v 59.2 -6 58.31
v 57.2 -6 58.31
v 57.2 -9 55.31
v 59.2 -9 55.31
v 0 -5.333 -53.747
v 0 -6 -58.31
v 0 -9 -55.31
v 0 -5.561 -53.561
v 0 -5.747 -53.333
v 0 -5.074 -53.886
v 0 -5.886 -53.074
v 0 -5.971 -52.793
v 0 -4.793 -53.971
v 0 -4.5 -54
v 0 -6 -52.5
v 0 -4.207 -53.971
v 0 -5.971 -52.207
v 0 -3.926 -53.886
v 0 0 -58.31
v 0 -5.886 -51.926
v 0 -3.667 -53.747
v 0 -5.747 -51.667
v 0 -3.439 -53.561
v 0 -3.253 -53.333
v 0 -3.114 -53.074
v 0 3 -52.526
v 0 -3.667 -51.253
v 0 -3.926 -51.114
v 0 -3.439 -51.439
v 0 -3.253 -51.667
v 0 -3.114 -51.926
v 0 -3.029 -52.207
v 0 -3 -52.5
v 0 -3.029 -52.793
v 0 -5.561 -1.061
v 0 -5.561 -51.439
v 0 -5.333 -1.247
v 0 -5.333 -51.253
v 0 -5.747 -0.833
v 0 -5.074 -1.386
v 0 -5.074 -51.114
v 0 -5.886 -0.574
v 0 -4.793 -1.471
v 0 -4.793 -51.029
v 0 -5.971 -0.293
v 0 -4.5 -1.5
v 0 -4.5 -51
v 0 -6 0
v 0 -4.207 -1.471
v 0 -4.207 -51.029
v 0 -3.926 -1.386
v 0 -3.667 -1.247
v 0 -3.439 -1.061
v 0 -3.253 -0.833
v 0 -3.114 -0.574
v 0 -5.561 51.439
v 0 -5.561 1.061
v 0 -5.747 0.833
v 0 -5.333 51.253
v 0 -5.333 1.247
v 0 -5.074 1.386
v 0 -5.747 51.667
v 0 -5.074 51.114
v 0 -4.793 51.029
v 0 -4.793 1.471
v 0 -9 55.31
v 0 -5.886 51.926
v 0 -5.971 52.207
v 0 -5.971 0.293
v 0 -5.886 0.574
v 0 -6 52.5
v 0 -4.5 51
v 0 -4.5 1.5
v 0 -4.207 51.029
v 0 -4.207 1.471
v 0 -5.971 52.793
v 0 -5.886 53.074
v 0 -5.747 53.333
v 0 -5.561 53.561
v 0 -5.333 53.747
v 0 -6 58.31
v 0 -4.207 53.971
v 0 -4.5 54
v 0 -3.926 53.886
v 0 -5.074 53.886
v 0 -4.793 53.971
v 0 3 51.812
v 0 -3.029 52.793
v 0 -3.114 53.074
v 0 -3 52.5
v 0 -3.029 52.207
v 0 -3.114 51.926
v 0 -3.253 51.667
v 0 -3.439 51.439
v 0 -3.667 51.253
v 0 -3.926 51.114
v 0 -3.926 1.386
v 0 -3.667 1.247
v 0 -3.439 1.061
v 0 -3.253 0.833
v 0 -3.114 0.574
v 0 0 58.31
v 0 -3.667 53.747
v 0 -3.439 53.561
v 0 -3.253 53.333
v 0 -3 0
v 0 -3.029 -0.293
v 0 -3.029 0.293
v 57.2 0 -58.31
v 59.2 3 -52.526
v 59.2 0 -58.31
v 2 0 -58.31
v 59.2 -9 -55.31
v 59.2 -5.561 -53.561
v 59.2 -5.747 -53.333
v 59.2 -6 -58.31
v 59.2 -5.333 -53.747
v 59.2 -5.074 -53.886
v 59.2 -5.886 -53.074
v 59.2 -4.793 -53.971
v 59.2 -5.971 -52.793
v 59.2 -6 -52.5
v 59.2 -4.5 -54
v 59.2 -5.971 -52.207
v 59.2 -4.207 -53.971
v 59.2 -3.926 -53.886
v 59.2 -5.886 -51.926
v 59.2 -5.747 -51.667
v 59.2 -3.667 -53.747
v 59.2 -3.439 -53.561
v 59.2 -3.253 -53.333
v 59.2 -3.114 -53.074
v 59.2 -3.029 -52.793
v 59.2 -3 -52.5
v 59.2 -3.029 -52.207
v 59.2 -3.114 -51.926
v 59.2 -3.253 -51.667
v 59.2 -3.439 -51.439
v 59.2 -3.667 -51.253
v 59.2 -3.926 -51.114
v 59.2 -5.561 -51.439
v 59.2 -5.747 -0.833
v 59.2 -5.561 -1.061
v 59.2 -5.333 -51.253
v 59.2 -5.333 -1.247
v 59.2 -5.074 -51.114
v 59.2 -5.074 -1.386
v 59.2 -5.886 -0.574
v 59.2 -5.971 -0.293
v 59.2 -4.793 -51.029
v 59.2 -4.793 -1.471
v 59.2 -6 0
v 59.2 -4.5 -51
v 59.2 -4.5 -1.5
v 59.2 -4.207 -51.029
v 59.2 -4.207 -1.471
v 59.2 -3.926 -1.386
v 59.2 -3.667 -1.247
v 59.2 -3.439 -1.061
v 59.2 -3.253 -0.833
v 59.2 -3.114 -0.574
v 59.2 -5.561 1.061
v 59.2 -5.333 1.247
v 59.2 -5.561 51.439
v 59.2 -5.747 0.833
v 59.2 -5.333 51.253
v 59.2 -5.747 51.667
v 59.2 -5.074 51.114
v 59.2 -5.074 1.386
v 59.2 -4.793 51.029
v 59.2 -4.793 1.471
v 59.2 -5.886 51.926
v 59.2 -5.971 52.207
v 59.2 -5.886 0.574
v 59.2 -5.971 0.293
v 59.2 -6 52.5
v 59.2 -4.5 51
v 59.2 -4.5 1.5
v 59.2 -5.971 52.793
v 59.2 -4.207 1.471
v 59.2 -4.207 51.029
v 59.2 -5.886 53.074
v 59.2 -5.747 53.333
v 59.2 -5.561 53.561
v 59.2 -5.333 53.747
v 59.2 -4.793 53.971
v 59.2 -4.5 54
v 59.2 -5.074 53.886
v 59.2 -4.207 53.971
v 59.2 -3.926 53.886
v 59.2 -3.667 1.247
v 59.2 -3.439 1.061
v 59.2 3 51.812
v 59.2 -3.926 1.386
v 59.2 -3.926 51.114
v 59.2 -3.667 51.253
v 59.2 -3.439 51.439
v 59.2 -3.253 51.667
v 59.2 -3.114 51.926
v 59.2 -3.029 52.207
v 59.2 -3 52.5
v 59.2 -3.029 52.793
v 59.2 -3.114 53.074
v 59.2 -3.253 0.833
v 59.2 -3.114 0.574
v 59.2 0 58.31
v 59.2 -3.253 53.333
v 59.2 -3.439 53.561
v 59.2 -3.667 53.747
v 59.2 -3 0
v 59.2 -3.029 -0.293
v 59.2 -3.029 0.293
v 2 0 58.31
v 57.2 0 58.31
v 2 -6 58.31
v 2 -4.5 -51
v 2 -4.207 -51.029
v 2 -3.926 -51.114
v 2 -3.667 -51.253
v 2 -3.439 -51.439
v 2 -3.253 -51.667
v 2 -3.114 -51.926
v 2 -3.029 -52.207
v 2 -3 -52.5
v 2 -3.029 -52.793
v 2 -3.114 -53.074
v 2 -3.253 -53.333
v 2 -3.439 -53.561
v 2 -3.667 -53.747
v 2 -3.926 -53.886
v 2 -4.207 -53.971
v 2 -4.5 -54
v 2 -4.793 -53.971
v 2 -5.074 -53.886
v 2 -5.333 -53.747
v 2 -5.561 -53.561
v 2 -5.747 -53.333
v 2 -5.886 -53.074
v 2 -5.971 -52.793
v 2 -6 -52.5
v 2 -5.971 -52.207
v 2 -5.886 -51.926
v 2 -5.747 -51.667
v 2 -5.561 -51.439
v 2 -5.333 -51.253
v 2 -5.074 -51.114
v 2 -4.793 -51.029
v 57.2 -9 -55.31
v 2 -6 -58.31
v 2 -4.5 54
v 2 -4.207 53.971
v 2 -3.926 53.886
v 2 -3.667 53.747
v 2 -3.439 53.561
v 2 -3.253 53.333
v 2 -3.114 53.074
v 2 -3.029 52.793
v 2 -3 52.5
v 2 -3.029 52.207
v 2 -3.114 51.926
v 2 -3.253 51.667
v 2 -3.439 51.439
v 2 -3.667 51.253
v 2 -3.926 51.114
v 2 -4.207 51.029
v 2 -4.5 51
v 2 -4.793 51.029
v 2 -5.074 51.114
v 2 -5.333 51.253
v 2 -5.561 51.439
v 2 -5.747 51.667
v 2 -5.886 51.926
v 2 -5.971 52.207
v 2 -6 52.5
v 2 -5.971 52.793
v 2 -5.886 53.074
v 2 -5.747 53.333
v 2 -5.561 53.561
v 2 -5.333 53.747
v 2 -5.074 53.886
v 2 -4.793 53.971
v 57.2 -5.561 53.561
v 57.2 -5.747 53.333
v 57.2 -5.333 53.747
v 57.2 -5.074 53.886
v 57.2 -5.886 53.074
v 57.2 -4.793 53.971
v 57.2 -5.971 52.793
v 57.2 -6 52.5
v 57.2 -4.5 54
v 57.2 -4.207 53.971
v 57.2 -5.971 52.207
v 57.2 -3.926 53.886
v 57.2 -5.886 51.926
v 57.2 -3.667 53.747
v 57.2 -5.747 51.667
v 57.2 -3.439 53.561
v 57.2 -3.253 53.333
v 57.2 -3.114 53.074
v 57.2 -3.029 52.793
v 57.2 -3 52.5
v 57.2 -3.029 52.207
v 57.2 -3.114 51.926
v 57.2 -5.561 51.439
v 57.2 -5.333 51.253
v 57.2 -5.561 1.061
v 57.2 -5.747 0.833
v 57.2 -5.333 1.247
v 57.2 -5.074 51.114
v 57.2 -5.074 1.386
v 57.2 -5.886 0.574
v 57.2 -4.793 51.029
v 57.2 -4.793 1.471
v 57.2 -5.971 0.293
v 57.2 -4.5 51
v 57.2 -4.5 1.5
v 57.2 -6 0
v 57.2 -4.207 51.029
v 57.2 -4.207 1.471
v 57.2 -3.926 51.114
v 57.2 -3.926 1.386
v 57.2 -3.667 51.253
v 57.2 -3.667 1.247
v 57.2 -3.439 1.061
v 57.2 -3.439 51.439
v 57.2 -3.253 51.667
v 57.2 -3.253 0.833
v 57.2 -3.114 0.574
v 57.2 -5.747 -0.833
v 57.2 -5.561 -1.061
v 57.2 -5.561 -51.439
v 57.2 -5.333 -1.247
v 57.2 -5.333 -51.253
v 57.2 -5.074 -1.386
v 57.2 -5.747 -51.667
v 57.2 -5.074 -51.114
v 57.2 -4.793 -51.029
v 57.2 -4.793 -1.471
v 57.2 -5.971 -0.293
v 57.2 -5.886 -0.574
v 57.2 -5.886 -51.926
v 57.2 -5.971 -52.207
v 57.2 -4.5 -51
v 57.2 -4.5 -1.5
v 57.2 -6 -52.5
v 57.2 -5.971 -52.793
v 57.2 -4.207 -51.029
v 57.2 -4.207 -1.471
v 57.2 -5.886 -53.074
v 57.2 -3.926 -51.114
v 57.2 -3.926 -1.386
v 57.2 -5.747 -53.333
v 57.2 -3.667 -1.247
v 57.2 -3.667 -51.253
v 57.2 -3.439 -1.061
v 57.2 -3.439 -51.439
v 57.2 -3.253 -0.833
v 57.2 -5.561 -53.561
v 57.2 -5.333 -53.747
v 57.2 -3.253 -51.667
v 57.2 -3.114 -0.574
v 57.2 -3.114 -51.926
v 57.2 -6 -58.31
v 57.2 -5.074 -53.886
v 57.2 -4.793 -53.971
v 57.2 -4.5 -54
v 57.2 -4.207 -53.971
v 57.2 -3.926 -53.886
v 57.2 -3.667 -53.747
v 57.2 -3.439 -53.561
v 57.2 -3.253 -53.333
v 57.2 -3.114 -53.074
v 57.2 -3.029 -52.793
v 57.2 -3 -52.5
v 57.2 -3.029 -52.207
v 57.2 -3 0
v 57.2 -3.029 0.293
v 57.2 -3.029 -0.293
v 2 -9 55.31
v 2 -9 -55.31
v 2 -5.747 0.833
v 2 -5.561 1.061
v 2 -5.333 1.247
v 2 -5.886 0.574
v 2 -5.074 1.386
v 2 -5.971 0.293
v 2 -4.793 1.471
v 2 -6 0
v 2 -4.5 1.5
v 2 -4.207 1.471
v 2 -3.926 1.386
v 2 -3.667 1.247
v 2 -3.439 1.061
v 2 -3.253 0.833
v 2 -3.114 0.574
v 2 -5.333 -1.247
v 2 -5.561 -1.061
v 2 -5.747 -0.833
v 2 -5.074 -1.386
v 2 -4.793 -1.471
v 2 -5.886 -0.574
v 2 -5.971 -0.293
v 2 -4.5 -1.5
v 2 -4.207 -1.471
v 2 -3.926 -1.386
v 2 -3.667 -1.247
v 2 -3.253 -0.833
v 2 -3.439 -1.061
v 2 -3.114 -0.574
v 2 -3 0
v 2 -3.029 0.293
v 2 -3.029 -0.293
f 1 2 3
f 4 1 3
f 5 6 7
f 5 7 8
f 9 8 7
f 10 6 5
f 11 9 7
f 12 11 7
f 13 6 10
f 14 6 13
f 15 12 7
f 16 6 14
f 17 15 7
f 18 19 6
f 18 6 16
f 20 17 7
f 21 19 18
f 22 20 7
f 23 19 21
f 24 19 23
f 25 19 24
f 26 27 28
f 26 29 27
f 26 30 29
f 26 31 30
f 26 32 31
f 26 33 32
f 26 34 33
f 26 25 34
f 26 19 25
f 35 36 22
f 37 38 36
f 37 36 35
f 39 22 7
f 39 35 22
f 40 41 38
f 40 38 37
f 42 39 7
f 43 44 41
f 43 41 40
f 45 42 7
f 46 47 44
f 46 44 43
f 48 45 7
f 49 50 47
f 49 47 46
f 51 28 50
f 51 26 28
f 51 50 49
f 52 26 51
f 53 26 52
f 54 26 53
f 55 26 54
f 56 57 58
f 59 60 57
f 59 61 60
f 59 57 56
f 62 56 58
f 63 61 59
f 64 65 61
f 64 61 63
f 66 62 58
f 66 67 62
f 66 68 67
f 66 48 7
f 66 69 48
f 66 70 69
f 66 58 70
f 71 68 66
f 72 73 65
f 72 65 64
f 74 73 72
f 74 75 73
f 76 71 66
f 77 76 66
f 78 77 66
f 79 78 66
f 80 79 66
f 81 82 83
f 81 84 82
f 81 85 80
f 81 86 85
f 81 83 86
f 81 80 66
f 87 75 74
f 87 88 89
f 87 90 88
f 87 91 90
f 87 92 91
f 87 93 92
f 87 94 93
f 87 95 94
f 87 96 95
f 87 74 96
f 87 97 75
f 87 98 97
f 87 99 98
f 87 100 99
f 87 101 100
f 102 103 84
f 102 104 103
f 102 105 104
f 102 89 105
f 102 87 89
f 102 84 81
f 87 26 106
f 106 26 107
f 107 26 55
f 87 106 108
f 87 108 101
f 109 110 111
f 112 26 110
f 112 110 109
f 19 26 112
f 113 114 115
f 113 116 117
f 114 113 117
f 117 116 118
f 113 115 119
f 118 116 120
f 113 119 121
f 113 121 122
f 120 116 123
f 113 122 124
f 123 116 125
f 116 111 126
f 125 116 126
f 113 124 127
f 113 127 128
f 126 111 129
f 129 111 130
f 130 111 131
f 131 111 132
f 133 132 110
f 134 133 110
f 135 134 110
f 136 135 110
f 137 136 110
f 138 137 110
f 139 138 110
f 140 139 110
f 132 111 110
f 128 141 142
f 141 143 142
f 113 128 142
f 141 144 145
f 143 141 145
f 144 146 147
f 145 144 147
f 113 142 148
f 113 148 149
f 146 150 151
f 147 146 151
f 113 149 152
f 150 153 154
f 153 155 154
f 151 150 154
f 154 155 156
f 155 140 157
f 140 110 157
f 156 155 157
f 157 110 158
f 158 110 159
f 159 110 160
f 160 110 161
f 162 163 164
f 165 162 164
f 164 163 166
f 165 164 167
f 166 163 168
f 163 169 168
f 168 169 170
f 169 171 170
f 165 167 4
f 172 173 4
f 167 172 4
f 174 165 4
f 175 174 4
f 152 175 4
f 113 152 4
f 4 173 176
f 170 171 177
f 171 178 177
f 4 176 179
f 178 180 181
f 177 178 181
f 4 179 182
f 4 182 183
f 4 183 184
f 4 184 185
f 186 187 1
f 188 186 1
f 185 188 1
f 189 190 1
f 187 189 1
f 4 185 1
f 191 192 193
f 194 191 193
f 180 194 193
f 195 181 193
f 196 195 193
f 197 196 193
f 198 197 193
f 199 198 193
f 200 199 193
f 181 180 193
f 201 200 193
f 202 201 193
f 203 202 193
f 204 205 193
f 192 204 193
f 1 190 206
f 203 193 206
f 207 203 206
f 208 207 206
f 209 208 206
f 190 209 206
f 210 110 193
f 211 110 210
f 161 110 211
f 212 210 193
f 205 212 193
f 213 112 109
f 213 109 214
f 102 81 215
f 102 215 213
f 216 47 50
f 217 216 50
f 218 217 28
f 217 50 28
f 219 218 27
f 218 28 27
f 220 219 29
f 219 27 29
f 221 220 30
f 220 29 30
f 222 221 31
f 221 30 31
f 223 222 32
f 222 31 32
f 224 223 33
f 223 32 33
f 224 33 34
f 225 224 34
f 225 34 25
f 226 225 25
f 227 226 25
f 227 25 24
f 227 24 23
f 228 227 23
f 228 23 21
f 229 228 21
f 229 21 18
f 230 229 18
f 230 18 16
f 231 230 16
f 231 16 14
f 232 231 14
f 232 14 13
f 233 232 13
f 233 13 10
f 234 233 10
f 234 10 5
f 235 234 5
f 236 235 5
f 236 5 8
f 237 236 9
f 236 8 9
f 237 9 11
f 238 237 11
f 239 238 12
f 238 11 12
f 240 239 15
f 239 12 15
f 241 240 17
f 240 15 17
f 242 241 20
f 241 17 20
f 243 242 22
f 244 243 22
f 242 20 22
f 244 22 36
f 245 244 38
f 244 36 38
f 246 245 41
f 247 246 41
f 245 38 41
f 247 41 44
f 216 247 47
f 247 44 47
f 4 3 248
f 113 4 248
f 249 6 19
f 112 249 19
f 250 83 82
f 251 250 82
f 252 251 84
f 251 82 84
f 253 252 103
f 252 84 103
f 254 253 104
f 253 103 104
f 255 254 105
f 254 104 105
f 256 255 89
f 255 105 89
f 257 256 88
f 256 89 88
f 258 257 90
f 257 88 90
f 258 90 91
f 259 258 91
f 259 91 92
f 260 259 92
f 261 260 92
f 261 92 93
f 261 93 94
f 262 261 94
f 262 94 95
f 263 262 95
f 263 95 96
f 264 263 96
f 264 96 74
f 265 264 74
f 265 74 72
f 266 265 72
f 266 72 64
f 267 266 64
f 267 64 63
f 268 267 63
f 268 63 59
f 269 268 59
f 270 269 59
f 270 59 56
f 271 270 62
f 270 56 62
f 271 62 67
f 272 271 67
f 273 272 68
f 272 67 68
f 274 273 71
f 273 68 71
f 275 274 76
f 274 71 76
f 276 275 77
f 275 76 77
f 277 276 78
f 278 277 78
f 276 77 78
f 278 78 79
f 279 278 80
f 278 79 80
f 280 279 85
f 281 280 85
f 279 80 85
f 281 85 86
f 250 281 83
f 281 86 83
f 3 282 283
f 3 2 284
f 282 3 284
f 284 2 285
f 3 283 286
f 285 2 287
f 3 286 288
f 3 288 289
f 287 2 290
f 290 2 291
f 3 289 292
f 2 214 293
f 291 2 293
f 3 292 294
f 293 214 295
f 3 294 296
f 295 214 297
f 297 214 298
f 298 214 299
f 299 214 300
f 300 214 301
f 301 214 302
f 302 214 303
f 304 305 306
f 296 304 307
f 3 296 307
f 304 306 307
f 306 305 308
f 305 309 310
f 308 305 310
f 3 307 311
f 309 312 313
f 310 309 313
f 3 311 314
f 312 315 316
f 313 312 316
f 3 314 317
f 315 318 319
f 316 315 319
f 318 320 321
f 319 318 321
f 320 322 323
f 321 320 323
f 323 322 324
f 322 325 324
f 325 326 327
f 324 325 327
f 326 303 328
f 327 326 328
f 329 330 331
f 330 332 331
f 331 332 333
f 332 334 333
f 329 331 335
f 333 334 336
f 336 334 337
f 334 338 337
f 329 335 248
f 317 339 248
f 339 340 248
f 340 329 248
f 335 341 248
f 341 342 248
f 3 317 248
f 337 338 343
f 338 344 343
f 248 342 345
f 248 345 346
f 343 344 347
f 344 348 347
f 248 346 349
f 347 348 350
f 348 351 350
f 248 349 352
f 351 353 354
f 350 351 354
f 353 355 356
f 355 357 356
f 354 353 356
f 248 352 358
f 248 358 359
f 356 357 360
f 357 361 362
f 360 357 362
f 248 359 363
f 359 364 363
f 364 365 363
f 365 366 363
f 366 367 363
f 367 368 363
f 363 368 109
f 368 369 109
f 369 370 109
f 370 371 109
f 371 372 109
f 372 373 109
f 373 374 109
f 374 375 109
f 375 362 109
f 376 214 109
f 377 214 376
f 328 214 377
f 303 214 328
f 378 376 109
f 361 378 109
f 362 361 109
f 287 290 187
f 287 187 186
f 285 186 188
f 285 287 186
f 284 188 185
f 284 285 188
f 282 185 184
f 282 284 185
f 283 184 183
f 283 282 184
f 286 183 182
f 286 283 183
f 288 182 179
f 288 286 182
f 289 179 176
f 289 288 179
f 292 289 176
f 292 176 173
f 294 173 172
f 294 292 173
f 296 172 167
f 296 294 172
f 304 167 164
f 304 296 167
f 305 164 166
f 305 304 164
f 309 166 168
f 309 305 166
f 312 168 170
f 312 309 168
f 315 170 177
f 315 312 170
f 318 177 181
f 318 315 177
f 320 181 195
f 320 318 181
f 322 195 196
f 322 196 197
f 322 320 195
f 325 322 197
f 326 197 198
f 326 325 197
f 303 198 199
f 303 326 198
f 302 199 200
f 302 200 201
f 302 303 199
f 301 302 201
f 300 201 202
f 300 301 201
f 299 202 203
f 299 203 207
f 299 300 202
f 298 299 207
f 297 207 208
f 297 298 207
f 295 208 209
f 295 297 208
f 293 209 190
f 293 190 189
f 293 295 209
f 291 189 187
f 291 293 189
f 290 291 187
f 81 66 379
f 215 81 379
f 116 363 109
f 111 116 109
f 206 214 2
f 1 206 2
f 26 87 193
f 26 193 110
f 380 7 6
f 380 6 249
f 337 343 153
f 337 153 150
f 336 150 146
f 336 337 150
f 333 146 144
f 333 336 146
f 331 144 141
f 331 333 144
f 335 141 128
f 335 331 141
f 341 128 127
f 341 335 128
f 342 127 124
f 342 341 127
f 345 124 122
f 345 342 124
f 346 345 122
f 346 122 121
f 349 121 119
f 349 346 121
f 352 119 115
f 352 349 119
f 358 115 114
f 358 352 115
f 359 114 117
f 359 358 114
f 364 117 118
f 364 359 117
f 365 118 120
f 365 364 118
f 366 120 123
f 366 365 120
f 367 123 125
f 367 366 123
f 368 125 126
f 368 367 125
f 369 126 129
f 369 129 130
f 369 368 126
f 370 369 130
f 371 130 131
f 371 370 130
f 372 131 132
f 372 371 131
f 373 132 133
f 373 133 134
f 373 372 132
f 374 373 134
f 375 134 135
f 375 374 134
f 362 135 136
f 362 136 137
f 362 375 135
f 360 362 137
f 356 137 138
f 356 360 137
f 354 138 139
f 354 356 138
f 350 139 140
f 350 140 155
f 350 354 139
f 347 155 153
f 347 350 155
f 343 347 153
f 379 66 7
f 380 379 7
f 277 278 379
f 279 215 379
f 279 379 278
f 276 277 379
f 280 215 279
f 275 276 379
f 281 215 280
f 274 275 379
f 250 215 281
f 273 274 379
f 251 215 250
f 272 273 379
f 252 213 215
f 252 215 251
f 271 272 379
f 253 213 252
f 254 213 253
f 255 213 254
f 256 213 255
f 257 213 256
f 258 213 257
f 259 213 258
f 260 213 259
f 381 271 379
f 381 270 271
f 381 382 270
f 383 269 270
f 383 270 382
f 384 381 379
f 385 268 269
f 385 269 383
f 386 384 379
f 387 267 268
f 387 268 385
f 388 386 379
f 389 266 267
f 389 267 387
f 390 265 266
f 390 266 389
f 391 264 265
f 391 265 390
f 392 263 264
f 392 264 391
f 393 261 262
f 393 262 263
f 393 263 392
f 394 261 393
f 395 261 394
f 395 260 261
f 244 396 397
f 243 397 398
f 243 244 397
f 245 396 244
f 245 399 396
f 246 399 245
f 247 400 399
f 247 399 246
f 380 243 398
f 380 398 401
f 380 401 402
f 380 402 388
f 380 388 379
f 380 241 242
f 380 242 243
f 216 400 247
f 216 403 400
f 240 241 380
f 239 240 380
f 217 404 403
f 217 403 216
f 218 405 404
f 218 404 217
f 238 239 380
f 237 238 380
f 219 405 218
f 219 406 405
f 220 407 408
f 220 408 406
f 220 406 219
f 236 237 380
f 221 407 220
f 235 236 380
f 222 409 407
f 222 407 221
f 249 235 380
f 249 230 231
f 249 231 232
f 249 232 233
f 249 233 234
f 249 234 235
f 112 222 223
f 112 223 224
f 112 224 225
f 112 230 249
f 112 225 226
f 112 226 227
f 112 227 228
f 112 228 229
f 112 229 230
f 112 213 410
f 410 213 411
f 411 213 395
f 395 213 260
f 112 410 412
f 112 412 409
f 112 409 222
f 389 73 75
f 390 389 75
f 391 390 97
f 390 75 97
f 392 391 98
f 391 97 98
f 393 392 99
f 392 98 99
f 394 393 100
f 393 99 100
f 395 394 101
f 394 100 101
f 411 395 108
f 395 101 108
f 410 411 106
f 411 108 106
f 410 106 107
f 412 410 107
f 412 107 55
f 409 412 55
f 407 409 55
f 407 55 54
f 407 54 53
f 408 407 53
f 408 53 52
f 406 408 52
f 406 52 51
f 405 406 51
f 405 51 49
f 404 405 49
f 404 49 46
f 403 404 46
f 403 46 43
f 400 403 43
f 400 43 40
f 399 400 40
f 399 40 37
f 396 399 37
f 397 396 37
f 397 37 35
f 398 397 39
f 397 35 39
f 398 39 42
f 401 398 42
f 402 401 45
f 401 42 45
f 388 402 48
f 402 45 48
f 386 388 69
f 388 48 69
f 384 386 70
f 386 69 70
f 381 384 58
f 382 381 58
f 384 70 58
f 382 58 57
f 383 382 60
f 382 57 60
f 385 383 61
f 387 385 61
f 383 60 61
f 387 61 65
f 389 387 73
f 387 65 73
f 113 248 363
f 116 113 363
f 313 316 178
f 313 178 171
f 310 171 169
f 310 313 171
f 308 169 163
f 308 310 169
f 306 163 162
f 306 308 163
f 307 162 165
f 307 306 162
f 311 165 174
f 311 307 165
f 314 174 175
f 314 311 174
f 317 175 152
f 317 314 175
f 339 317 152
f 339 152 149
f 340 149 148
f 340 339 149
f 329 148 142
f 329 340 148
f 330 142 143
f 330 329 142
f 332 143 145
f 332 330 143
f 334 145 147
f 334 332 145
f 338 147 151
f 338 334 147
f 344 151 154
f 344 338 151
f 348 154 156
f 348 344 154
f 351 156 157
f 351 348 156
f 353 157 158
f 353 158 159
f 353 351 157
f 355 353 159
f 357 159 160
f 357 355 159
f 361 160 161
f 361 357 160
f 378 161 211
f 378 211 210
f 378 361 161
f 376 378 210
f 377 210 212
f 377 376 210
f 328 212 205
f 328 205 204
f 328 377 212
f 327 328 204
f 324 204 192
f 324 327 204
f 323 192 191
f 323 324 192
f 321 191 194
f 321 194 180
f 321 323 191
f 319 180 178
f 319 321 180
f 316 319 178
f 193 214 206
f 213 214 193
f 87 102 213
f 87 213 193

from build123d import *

# Parameters (mm, degrees)
SKETCH1_W           = 116.62
SKETCH1_H           = 9
BOSS_EXTRUDE1_DEPTH = 2
SKETCH6_R           = 1.5
CUT_EXTRUDE1_DEPTH  = 60.034363721
CHAMFER4_SIZE       = 3
SKETCH9_R           = 1.5
BOSS_EXTRUDE4_DEPTH = 2
BOSS_EXTRUDE5_START = -2
BOSS_EXTRUDE5_DEPTH = 59.2


with BuildPart() as part:
    # Sketch1 → Boss-Extrude1 (new body)
    with BuildSketch(Plane(origin=(0, 0, 0), x_dir=(0, 0, -1), z_dir=(1, 0, 0))):
        with Locations((0, -4.5)):
            Rectangle(SKETCH1_W, SKETCH1_H)
    extrude(amount=BOSS_EXTRUDE1_DEPTH)

    # Sketch6 → Cut-Extrude1 (cut, through all)
    with BuildSketch(Plane.ZY):
        with Locations((0, -4.5)):
            Circle(SKETCH6_R)
        with Locations((52.5, -4.5)):
            Circle(SKETCH6_R)
        with Locations((-52.5, -4.5)):
            Circle(SKETCH6_R)
    extrude(amount=-CUT_EXTRUDE1_DEPTH, mode=Mode.SUBTRACT)

    # Chamfer4
    chamfer4_edges = [part.edges().sort_by_distance(p)[0] for p in [
        (1, -9, -58.31),
        (1, -9, 58.31),
    ]]
    chamfer(chamfer4_edges, length=CHAMFER4_SIZE)



with BuildPart() as body_2:
    # Sketch9 → Boss-Extrude4 (new body)
    with BuildSketch(Plane(origin=(57.2, 0, 0), x_dir=(0, 0, -1), z_dir=(1, 0, 0))):
        Polygon((-58.31, 0), (-58.31, -6), (-55.31, -9), (55.31, -9), (58.31, -6), (58.31, 0), align=None)
        with Locations(Location((0, -4.5, 0), (0, 0, 180))):
            Circle(SKETCH9_R, mode=Mode.SUBTRACT)
        with Locations(Location((-52.5, -4.5, 0), (0, 0, 180))):
            Circle(SKETCH9_R, mode=Mode.SUBTRACT)
        with Locations(Location((52.5, -4.5, 0), (0, 0, 180))):
            Circle(SKETCH9_R, mode=Mode.SUBTRACT)
    extrude(amount=BOSS_EXTRUDE4_DEPTH)


with BuildPart() as part_1:
    add(part.part)

    add(body_2.part)  # Boss-Extrude5 merges body 2
    # Sketch4 → Boss-Extrude5 (add)
    with BuildSketch(Plane(origin=(2, 0, 0), x_dir=(0, 0, -1), z_dir=(1, 0, 0)).offset(BOSS_EXTRUDE5_START)):
        Polygon((-58.31, 0), (-51.811665078, 3), (52.525651767, 3), (58.31, 0), align=None)
    extrude(amount=BOSS_EXTRUDE5_DEPTH)


solid = part_1.part
